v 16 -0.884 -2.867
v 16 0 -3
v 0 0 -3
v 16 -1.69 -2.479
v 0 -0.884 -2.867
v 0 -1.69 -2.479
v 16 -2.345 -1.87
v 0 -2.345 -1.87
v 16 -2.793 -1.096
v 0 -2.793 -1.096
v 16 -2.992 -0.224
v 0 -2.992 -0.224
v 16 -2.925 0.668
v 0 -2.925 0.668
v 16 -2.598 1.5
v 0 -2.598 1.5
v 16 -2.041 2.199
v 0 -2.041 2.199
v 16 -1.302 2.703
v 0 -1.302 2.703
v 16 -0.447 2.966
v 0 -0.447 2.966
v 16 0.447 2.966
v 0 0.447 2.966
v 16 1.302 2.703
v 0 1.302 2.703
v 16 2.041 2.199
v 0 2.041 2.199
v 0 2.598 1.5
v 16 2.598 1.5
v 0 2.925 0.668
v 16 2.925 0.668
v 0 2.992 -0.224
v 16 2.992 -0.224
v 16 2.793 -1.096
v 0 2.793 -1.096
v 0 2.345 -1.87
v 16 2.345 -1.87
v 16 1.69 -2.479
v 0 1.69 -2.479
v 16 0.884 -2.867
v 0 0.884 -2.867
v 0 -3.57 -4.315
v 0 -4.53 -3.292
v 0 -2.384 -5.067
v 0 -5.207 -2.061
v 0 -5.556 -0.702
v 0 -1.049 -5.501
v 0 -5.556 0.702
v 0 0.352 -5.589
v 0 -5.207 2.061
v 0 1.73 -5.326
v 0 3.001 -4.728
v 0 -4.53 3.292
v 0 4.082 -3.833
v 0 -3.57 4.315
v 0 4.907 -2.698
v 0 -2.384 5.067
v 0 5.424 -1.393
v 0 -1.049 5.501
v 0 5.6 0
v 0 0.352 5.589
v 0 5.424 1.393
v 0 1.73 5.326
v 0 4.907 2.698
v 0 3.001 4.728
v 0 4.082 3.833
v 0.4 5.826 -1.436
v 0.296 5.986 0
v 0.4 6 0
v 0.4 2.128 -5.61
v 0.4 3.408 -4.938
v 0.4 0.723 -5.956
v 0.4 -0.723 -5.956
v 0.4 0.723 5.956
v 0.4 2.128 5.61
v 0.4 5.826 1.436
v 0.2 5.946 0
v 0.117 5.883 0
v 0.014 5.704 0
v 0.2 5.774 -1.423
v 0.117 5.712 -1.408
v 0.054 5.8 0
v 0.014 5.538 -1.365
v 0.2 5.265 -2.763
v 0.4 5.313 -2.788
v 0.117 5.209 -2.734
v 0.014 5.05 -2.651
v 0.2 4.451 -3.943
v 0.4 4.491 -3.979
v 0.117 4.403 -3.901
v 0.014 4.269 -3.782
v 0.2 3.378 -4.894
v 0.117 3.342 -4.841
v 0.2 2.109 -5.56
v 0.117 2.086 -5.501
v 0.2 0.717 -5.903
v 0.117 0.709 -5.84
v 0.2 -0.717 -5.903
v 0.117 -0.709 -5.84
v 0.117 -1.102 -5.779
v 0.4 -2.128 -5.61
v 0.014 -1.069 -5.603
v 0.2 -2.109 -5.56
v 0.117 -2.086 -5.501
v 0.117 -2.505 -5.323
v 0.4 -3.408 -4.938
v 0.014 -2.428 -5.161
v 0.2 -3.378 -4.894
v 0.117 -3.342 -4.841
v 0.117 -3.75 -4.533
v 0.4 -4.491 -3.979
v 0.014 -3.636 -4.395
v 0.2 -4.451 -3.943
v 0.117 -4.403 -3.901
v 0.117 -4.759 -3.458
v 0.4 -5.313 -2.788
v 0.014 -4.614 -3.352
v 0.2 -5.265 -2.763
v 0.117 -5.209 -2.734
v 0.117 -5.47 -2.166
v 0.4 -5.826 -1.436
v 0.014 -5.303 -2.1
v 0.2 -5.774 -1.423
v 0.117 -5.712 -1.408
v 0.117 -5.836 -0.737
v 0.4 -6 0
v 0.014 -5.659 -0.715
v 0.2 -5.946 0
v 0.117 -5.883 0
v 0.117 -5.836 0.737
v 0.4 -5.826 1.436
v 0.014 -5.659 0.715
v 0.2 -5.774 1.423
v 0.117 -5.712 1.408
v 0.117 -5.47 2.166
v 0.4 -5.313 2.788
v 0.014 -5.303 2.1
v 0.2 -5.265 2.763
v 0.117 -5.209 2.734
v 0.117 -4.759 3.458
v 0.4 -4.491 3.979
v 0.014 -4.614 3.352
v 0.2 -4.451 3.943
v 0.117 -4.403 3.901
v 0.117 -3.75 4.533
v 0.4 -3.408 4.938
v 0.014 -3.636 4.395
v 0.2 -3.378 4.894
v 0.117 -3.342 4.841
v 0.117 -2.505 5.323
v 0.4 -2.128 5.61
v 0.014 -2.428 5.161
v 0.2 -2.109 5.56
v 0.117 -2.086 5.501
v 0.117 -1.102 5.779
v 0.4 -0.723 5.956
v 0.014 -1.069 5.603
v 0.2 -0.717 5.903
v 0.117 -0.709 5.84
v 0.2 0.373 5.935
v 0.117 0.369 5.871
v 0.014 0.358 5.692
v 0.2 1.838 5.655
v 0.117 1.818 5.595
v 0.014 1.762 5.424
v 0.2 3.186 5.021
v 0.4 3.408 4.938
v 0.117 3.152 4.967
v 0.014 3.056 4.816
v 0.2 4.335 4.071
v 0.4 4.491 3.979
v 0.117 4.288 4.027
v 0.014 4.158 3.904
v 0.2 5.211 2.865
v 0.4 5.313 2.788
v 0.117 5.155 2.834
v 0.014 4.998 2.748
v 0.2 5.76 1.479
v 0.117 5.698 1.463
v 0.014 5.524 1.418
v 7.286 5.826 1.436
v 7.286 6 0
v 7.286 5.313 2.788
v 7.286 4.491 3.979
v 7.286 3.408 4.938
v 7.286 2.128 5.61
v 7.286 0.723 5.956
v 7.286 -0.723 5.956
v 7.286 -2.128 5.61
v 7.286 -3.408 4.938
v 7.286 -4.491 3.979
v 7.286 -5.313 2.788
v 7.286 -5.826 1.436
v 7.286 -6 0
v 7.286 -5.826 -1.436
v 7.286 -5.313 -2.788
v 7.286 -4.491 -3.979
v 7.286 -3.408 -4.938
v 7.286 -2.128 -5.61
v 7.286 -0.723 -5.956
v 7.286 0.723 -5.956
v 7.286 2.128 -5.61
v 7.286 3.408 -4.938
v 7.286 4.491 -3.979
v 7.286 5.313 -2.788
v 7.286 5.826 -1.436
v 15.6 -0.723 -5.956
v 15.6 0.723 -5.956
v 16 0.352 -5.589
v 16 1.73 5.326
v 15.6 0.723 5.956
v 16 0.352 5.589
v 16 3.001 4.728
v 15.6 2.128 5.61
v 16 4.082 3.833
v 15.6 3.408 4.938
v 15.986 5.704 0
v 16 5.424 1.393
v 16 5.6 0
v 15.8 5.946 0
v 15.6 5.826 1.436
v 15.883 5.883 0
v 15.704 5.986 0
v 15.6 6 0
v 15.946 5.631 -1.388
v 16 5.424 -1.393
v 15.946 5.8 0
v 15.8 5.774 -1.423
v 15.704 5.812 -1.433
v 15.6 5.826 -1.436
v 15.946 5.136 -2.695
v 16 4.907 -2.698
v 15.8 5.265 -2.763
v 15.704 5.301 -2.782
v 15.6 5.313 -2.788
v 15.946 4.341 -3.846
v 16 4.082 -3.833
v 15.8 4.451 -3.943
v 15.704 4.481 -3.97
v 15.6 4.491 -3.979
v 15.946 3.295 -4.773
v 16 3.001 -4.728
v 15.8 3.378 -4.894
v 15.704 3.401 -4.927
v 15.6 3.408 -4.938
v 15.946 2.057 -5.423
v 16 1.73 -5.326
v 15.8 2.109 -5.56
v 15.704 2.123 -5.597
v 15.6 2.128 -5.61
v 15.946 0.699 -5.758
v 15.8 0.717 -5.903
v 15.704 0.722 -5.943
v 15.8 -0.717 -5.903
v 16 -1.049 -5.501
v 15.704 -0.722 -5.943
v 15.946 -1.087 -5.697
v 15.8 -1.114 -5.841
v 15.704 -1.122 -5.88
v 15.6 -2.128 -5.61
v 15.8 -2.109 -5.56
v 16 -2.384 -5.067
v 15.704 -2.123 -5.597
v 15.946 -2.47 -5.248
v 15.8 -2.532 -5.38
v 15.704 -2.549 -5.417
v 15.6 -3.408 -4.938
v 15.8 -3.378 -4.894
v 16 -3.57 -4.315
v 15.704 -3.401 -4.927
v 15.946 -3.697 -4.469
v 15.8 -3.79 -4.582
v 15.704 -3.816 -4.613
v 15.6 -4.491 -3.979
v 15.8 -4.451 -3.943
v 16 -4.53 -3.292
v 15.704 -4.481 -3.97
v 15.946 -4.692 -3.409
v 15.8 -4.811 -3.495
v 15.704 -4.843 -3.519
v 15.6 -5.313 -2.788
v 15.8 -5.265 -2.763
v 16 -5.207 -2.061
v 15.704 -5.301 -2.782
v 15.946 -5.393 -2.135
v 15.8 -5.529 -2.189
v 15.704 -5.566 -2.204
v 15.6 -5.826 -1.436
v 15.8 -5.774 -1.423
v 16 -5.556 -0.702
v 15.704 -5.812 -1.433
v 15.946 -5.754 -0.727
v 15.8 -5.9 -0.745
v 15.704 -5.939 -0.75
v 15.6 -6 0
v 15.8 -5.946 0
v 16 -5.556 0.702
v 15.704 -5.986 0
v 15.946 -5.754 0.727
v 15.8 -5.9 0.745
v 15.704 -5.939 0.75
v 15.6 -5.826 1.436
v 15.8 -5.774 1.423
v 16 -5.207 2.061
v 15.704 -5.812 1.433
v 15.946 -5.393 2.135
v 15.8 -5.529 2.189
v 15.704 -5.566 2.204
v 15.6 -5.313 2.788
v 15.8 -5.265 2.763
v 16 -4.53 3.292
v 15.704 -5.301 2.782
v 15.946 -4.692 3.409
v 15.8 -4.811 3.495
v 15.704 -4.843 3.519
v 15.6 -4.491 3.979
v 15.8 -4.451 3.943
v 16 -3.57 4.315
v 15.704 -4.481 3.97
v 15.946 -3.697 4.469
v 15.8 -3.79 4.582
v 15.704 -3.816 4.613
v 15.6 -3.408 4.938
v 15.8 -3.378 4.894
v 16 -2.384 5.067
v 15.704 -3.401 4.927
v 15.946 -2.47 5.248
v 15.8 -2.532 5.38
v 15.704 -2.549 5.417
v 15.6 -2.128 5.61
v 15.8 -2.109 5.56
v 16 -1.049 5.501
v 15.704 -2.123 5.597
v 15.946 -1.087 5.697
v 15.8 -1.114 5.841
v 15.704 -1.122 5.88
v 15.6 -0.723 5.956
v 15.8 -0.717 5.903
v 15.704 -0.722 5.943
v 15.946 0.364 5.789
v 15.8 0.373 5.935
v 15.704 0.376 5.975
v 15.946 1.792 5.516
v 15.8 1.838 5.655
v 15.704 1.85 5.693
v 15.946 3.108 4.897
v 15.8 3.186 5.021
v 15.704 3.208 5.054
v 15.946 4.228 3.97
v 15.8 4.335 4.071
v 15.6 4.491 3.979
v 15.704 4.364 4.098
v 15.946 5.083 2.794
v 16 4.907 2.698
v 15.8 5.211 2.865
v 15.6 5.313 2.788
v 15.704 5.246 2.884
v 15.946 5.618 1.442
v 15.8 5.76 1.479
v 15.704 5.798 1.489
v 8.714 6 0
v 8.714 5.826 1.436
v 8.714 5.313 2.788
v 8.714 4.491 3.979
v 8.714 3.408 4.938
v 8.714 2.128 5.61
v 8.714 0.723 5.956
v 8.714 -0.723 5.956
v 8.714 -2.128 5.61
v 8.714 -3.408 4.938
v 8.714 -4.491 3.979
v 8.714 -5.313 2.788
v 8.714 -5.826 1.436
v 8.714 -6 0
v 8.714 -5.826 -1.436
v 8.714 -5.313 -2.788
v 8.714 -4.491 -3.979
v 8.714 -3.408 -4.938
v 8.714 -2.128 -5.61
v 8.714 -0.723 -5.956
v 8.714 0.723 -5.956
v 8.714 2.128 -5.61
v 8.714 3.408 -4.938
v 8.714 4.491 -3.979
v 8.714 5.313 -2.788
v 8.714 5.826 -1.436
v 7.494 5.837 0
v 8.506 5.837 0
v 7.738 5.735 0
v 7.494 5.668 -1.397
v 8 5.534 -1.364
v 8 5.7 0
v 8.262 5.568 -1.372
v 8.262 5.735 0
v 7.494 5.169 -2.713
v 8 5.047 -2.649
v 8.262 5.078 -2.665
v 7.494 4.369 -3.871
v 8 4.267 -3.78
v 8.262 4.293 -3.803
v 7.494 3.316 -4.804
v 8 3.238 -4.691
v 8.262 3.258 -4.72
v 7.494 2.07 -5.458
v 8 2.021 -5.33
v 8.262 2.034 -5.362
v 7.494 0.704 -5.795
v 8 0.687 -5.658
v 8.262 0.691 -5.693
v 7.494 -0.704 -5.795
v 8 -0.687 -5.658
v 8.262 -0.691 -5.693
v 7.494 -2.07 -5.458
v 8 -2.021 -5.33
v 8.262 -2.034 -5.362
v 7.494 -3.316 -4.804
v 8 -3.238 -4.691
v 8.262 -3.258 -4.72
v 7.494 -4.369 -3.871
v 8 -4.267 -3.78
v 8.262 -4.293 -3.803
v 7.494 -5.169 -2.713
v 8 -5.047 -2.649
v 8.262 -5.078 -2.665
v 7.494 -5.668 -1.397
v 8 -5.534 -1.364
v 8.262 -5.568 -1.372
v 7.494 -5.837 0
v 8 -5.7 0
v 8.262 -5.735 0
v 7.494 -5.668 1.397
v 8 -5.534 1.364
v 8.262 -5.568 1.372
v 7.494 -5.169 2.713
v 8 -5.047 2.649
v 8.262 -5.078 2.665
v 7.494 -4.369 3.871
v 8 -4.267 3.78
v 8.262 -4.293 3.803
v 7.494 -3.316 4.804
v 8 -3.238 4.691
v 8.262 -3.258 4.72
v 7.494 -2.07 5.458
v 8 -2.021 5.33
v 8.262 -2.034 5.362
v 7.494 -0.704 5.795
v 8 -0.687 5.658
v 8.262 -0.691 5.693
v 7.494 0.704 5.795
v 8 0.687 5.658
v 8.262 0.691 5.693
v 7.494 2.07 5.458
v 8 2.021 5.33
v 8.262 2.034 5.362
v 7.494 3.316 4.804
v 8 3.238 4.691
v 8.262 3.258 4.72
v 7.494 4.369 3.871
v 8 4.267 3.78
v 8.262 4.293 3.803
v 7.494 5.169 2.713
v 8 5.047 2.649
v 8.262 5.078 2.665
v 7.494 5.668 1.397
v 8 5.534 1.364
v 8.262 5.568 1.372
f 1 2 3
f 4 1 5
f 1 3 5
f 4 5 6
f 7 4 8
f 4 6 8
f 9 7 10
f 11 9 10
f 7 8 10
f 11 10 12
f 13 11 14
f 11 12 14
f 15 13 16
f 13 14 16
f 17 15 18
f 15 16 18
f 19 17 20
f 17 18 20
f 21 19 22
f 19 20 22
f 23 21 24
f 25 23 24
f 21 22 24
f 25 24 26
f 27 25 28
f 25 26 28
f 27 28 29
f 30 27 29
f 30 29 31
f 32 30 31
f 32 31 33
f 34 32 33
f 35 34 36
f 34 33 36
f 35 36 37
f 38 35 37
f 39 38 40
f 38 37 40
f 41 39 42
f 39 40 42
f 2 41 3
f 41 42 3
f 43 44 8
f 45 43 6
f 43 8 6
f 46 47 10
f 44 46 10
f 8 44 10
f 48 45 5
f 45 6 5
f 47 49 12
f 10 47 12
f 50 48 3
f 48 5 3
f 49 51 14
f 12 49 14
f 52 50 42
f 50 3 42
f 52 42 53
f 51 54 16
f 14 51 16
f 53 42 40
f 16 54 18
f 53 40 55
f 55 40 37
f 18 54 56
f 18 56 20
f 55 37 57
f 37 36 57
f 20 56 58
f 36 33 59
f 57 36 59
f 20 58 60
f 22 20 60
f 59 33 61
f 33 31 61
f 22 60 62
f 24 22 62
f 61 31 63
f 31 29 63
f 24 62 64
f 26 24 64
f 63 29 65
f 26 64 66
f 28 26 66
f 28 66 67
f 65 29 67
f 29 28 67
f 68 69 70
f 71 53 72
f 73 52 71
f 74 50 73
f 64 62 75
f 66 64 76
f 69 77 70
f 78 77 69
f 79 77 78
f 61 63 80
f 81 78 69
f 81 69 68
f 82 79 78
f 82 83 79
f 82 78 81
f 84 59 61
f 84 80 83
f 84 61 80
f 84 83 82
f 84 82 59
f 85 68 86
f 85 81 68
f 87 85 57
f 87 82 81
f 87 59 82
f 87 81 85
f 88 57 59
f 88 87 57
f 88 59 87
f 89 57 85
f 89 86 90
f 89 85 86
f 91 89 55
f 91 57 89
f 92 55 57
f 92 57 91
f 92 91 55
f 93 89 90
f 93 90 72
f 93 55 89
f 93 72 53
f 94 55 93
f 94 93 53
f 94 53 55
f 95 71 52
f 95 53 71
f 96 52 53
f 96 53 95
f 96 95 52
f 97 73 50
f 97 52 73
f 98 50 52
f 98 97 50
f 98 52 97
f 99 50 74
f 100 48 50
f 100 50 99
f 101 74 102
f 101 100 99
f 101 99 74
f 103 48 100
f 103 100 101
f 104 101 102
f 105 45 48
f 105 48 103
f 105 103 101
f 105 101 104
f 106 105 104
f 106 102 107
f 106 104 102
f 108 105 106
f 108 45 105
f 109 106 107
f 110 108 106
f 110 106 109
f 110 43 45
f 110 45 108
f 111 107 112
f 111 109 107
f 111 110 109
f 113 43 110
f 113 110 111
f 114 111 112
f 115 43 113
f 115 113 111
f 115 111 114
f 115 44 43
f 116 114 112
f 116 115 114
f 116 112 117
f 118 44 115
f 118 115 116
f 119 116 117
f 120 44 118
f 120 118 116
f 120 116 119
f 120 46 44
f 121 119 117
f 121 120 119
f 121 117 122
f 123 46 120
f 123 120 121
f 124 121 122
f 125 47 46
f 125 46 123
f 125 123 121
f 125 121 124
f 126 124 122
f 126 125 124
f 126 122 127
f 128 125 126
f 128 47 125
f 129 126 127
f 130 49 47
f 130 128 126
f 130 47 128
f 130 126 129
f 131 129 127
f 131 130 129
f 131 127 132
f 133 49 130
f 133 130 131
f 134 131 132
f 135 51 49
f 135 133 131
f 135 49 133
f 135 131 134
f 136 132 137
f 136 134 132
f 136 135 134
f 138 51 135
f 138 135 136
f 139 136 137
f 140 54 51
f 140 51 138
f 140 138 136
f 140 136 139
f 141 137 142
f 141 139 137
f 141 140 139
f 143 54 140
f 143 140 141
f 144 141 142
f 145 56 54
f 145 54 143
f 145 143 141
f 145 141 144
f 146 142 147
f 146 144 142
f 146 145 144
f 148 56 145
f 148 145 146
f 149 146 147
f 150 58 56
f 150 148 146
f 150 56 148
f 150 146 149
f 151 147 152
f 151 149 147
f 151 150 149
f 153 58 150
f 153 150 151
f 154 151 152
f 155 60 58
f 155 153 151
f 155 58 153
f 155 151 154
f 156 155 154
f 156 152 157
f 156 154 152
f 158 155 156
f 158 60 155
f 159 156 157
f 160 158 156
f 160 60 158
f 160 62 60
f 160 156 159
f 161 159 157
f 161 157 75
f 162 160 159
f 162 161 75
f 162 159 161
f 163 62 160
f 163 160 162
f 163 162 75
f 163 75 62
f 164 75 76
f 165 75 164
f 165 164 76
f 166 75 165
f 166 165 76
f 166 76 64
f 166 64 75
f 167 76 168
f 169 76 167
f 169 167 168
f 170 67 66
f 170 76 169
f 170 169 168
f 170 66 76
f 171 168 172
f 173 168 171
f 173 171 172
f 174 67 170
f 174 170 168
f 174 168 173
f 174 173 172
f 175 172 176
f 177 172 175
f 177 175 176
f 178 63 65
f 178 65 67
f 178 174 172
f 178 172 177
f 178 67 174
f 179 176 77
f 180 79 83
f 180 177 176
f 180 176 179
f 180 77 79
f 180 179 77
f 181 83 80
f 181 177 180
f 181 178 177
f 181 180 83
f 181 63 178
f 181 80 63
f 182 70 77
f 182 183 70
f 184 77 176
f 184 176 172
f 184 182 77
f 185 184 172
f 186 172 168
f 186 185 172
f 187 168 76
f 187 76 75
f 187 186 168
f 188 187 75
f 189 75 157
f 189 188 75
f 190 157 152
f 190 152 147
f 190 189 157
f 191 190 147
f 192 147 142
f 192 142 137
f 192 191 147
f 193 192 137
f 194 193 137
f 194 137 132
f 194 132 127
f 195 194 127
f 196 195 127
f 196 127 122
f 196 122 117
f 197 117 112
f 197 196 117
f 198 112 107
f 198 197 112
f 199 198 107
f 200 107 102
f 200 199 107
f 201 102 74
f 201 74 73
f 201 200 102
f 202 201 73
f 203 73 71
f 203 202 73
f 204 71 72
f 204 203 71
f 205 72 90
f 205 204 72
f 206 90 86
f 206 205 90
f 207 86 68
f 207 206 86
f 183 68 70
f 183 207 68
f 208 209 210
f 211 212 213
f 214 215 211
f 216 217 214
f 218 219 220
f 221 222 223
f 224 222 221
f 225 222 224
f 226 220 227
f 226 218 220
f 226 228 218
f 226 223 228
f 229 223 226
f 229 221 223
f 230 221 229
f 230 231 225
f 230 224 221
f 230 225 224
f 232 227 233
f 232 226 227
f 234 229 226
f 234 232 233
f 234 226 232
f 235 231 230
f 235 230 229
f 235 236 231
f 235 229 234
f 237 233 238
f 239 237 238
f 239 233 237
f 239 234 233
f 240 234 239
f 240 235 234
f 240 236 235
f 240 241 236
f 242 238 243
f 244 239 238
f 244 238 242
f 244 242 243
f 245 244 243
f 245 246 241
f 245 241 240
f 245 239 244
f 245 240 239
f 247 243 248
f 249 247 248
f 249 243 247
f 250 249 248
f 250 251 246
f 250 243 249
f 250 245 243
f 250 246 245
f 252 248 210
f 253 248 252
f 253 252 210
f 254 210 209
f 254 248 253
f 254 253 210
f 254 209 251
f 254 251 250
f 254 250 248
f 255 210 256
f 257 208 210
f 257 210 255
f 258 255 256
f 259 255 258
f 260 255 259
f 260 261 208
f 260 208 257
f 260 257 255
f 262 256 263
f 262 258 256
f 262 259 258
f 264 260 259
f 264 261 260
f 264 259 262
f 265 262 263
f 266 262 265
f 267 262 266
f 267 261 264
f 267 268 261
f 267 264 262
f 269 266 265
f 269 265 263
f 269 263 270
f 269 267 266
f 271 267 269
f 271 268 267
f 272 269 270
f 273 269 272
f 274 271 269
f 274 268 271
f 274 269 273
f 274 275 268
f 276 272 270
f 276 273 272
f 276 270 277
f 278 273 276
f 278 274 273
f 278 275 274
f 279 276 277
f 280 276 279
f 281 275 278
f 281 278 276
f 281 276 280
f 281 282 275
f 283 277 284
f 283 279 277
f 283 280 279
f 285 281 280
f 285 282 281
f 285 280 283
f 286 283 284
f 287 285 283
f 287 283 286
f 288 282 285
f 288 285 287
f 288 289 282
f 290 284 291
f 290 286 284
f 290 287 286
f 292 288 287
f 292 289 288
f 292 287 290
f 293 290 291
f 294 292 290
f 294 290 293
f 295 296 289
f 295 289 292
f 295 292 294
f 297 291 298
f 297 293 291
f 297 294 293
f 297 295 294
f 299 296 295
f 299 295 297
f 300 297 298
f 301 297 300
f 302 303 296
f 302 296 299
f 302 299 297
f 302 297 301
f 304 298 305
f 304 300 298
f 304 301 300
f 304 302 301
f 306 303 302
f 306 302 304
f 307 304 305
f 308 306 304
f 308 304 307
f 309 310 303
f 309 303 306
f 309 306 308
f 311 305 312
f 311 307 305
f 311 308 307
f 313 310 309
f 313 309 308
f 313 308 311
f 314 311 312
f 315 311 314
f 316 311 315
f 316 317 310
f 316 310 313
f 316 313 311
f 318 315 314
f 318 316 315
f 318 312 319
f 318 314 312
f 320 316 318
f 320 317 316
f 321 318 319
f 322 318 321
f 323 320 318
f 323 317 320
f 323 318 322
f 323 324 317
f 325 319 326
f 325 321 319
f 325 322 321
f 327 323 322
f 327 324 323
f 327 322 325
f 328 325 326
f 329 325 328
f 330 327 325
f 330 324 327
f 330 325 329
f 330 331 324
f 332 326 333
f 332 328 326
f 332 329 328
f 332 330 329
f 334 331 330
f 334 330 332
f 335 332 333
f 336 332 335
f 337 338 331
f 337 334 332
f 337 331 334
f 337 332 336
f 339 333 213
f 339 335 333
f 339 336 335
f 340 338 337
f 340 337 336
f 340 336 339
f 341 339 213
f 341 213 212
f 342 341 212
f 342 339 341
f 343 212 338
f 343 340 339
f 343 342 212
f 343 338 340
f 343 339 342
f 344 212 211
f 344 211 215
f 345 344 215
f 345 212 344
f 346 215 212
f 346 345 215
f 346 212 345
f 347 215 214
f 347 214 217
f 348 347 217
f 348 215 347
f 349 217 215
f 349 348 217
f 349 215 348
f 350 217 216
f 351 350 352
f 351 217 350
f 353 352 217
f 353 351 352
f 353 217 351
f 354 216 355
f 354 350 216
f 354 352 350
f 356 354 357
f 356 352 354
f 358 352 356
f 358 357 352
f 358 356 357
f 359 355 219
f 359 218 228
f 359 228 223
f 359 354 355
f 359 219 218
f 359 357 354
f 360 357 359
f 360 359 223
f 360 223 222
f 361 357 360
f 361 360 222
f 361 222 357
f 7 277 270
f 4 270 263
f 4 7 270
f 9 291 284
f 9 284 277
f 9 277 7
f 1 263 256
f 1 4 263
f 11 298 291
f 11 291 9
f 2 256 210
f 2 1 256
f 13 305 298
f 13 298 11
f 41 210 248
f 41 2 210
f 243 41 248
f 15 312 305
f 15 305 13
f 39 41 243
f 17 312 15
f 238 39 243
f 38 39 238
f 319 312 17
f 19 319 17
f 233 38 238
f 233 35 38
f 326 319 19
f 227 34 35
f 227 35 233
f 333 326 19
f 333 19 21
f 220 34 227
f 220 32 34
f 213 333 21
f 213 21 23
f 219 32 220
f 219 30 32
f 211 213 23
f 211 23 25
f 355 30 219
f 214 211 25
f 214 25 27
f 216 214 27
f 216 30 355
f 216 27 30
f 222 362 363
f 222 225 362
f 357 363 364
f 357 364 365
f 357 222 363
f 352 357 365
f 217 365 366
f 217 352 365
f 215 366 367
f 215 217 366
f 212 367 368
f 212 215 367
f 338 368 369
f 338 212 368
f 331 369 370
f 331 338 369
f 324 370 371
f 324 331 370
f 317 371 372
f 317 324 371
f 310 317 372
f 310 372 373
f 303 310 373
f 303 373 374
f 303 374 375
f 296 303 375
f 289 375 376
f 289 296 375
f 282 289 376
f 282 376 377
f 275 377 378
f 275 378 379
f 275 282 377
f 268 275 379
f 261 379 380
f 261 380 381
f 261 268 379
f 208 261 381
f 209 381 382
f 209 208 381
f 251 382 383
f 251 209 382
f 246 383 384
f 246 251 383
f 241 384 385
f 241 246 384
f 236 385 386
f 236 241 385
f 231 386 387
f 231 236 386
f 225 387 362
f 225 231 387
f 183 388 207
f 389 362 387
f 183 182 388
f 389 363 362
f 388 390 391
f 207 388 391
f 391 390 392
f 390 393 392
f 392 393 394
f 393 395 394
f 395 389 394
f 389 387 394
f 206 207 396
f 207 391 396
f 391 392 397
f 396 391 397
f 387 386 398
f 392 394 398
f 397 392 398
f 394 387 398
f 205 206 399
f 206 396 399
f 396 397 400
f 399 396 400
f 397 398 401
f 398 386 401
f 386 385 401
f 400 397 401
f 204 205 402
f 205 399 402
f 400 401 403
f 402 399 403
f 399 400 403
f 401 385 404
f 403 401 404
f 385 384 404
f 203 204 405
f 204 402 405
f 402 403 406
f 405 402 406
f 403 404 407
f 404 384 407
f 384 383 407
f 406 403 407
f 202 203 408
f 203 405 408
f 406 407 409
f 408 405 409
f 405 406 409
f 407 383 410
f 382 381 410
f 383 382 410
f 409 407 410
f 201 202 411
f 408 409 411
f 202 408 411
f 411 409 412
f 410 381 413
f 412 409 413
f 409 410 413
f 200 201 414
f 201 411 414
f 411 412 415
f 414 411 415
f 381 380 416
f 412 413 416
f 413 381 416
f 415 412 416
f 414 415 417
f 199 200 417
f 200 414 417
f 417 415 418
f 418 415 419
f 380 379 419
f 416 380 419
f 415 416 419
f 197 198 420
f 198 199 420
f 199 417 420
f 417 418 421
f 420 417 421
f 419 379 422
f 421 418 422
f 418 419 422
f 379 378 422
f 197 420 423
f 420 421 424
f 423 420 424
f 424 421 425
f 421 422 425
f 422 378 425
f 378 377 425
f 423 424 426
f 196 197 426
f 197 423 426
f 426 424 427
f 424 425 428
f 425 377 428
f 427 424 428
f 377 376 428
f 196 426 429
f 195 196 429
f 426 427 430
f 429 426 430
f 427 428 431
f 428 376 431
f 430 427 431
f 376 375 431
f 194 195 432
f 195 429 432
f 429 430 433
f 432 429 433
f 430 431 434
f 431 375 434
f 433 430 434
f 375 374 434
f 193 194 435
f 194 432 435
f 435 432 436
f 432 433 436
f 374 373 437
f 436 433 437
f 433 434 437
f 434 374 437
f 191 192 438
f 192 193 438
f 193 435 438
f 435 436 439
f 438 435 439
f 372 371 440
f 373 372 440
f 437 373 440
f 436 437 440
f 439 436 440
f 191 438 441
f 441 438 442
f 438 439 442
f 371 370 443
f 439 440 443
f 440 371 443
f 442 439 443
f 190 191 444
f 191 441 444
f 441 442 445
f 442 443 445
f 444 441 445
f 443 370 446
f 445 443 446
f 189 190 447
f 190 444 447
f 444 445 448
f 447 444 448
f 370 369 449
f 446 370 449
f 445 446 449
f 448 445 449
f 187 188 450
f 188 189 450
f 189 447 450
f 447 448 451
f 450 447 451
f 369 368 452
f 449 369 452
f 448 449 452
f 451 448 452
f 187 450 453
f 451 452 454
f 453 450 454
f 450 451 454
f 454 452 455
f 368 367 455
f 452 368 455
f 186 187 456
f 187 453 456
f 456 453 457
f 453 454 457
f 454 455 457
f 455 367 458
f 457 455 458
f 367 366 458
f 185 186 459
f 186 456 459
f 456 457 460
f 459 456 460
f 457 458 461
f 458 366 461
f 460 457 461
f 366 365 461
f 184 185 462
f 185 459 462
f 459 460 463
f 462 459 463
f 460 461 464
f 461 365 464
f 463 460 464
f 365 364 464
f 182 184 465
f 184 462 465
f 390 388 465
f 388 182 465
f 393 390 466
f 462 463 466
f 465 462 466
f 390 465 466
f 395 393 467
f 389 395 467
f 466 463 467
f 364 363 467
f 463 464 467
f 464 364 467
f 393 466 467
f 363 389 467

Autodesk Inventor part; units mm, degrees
ref_plane "YZ Plane" through (0, 0, 0) normal (1, 0, 0) x (0, 1, 0)
ref_plane "XZ Plane" through (0, 0, 0) normal (0, 1, 0) x (-1, 0, 0)
ref_plane "XY Plane" through (0, 0, 0) normal (0, 0, 1) x (1, 0, 0)
sketch "Sketch_1" plane through (0, 0, 0) normal (0, 0, 1) x (1, 0, 0)
  line L0 (16, 0) -> (0, 0)
  line L1 (0, 0) -> (0, 5.6)
  arc A0 (0.4, 6) -> (0, 5.6) centre (0.4, 5.6) ccw
  line L2 (0.4, 6) -> (7.2859, 6)
  arc A1 (7.2859, 6) -> (8.7141, 6) centre (8, 6.7) ccw
  line L3 (8.7141, 6) -> (15.6, 6)
  arc A2 (16, 5.6) -> (15.6, 6) centre (15.6, 5.6) ccw
  line L4 (16, 5.6) -> (16, 0)
  line L5 (16, 0) -> (0, 0)
revolve "Revolution1" add sketch "Sketch_1" angle 360 about axis through (16, 0, 0) along (1, 0, 0)
sketch "Sketch2" plane through (16, 0, 0) normal (1, 0, 0) x (0, 0, -1)
  point P0 (0, 0)
hole "Hole1" at (16, 0, 0) direction (-1, 0, 0) diameter 6 depth 16
properties part number "LMUT6" material "鉄、鋳鉄"
